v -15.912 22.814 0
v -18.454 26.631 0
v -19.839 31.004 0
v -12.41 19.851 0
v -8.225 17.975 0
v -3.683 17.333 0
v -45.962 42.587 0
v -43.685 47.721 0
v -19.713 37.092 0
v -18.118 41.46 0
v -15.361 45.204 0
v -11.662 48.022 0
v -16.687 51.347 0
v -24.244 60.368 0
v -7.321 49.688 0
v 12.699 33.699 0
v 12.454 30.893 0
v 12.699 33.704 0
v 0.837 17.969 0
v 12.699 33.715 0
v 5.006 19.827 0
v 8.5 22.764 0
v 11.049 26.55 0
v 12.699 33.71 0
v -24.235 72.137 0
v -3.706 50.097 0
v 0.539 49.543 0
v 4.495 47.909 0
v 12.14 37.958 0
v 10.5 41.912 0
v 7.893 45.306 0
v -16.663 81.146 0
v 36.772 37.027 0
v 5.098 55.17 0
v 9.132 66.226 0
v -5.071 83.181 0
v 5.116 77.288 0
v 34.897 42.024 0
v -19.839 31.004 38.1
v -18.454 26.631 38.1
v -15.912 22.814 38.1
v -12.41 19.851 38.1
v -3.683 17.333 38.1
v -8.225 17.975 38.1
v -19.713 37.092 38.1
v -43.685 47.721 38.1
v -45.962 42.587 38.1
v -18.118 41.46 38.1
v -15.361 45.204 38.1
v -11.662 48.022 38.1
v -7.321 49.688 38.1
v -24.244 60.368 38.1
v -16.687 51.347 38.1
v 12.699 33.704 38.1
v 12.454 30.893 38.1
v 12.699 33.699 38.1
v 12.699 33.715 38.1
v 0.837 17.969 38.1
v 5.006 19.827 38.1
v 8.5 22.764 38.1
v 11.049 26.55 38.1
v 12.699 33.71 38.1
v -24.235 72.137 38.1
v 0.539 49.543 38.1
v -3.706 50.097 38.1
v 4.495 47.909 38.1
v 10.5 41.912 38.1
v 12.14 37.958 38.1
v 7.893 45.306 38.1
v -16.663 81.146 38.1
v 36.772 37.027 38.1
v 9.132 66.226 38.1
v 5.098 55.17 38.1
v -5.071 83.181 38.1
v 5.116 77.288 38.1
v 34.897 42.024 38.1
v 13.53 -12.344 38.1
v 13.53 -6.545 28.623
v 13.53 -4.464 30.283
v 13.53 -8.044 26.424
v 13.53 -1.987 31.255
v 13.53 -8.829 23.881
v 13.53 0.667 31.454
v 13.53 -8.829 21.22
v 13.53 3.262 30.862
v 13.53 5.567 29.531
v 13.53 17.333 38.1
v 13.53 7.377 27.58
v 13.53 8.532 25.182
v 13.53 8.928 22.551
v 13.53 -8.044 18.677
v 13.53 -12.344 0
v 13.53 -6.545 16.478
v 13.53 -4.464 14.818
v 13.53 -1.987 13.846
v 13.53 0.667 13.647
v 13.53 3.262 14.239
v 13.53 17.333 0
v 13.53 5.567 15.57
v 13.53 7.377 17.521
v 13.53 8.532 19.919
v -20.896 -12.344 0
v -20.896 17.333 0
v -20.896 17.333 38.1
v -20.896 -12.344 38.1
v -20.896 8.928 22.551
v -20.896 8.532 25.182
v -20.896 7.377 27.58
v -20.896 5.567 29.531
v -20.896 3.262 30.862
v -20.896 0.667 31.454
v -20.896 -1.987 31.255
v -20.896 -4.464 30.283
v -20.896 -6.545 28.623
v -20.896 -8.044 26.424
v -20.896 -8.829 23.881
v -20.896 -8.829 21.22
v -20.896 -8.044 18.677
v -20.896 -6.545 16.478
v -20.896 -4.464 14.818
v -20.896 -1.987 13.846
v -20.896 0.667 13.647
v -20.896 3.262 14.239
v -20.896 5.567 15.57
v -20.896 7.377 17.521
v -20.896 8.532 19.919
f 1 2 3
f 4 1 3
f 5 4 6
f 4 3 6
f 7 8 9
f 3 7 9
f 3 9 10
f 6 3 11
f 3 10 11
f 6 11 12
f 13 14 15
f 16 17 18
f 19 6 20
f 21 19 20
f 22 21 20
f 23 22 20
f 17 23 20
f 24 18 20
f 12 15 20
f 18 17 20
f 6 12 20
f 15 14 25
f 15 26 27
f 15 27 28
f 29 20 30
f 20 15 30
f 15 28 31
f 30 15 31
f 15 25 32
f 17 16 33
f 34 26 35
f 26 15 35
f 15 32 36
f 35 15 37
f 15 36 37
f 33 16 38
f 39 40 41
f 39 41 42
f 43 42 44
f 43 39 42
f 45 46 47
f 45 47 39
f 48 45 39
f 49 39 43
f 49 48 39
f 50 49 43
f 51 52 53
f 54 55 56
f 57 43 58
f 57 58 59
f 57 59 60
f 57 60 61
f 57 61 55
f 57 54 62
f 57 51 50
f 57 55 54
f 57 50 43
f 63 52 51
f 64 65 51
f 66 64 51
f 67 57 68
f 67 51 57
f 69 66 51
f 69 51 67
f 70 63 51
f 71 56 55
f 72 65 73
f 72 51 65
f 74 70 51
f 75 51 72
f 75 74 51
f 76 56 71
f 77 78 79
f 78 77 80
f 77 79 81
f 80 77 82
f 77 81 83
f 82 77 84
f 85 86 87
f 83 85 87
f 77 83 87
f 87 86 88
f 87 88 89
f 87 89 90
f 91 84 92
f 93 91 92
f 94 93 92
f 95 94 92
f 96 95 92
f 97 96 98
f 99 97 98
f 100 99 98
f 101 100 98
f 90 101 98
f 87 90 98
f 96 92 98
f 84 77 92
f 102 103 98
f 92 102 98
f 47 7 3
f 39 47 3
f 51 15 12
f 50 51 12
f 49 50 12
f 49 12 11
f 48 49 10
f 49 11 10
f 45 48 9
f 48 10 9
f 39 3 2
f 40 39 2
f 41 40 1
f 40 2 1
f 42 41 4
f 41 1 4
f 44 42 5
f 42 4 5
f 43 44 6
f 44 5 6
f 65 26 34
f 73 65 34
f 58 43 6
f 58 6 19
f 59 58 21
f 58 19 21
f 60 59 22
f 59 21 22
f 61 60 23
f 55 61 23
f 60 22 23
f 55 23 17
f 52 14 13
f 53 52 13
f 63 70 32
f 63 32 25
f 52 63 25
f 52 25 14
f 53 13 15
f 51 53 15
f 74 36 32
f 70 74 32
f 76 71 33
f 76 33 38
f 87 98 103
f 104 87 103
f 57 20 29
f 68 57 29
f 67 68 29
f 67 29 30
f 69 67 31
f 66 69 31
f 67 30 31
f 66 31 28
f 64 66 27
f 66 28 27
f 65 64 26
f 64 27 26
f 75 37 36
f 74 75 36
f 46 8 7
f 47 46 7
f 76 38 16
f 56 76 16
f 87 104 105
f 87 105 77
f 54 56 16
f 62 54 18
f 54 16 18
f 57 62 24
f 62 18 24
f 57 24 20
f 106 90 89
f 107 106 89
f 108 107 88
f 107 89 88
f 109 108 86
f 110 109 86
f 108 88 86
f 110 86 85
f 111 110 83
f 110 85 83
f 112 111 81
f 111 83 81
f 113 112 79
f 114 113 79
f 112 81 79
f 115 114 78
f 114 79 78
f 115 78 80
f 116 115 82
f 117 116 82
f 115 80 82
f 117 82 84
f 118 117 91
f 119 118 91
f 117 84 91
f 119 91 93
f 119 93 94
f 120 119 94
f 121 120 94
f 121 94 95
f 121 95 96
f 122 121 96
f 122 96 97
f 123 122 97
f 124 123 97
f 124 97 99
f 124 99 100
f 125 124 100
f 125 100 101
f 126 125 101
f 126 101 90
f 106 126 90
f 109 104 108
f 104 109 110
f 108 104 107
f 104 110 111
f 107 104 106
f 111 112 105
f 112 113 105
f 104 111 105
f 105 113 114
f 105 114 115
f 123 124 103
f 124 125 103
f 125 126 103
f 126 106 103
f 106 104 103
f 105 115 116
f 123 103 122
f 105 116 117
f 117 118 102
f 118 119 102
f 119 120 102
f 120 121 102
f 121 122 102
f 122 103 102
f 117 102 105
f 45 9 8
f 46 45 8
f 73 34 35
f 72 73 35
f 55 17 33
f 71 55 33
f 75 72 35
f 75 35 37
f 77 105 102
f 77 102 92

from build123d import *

# Parameters (mm, degrees)
F1_DEPTH = 38.1
F2_R     = 8.9283509737
F3_DEPTH = 76.2


with BuildPart() as f1:
    # F0 (on Top) → F1 (new body)
    with BuildSketch(Plane.XY):
        with BuildLine():
            ThreePointArc((-19.8392088322, 31.0042282186), (-14.2652326938, 21.2094117356), (-3.6831426706, 17.3329428959))
            ThreePointArc((-3.6831426706, 17.3329428959), (6.8558147514, 21.1730402179), (12.4538692011, 30.8930071604))
            ThreePointArc((12.4538692011, 30.8930071604), (12.6367274551, 32.2908793662), (12.6987227546, 33.6992970697))
            ThreePointArc((12.6987227546, 33.6992970697), (12.6987282674, 33.7070563908), (12.698730105, 33.7148157137))
            ThreePointArc((12.698730105, 33.7148157137), (7.8926833262, 45.3064509968), (-3.705500355, 50.096673275))
            Line((-3.705500355, 50.096673275), (-5.0983826818, 49.2939955798))
            Line((-5.0983826818, 49.2939955798), (-7.320754889, 49.6877157221))
            ThreePointArc((-7.320754889, 49.6877157221), (-15.3607260497, 45.2039324958), (-19.7131103672, 37.0920770336))
            ThreePointArc((-19.7131103672, 37.0920770336), (-20.0615024695, 34.0540629729), (-19.8392088322, 31.0042282186))
        make_face()
        with BuildLine():
            Line((-45.9615329933, 42.5867497672), (-19.8392088322, 31.0042282186))
            ThreePointArc((-19.8392088322, 31.0042282186), (-20.0615024695, 34.0540629729), (-19.7131103672, 37.0920770336))
            Line((-19.7131103672, 37.0920770336), (-43.6849854887, 47.7210991085))
            Line((-43.6849854887, 47.7210991085), (-45.9615329933, 42.5867497672))
        make_face()
        with BuildLine():
            ThreePointArc((12.6987227546, 33.6992970697), (12.6367274551, 32.2908793662), (12.4538692011, 30.8930071604))
            Line((12.4538692011, 30.8930071604), (36.7716592372, 37.0266938141))
            Line((36.7716592372, 37.0266938141), (34.897346632, 42.0244557041))
            Line((34.897346632, 42.0244557041), (12.6987227546, 33.6992970697))
        make_face()
        with BuildLine():
            Line((-16.6866425288, 51.3469961082), (-7.320754889, 49.6877157221))
            ThreePointArc((-7.320754889, 49.6877157221), (-5.524516205, 49.9928715154), (-3.705500355, 50.096673275))
            Line((-3.705500355, 50.096673275), (5.0983826818, 55.1700957808))
            Line((5.0983826818, 55.1700957808), (9.1324737239, 66.2258041215))
            Line((9.1324737239, 66.2258041215), (5.116294412, 77.2880317989))
            Line((5.116294412, 77.2880317989), (-5.070940319, 83.1806395397))
            Line((-5.070940319, 83.1806395397), (-16.66251012, 81.146410693))
            Line((-16.66251012, 81.146410693), (-24.2345906551, 72.137183544))
            Line((-24.2345906551, 72.137183544), (-24.2441212877, 60.3684756023))
            Line((-24.2441212877, 60.3684756023), (-16.6866425288, 51.3469961082))
        make_face()
        with BuildLine():
            ThreePointArc((-3.705500355, 50.096673275), (-5.524516205, 49.9928715154), (-7.320754889, 49.6877157221))
            Line((-7.320754889, 49.6877157221), (-5.0983826818, 49.2939955798))
            Line((-5.0983826818, 49.2939955798), (-3.705500355, 50.096673275))
        make_face()
    extrude(amount=F1_DEPTH)


with BuildPart() as f1b:
    # F0 (on Top) → F1, piece 2 (new body)
    with BuildSketch(Plane.XY):
        Polygon((-3.6831426706, 17.3329428959), (-20.8959778534, 17.3329428959), (-20.8959778534, -12.3443568868), (13.5296924277, -12.3443568868), (13.5296924277, 17.3329428959), align=None)
    extrude(amount=F1_DEPTH)

    # F2 (on face) → F3 (cut)
    with BuildSketch(Plane.YZ.offset(13.5296924277)):
        with Locations((0, 22.5505493581)):
            Circle(F2_R)
    extrude(amount=-F3_DEPTH, mode=Mode.SUBTRACT)


solid = Compound([f1.part, f1b.part])
